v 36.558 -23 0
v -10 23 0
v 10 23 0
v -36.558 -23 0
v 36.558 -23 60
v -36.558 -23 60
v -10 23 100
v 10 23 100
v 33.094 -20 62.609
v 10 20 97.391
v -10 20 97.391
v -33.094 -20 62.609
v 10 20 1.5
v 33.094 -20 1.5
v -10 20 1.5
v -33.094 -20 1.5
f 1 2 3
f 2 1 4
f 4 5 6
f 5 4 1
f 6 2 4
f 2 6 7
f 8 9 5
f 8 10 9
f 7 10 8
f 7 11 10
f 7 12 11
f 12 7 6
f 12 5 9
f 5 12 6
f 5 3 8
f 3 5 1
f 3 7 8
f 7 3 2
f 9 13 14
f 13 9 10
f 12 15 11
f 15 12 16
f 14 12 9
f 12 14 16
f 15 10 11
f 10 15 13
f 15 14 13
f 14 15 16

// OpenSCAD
module trapezoid(b, t, h) {
    polygon(points=[
        [-b/2, -h/2],
        [+b/2, -h/2],
        [+t/2, +h/2],
        [-t/2, +h/2]
    ]);
}

module sloped_trapezoid_3d(trapezoid_base, trapezoid_top, trapezoid_height, min_height, max_height) {
    base_pts = [
        [-trapezoid_base/2, -trapezoid_height/2],
        [+trapezoid_base/2, -trapezoid_height/2],
        [+trapezoid_top/2, +trapezoid_height/2],
        [-trapezoid_top/2, +trapezoid_height/2]
    ];
    
    // Convert base points to 3D bottom and sloped top
    bottom = [for (p = base_pts) [p[0], p[1], 0]];
    top = [
        [base_pts[0][0], base_pts[0][1], min_height],  // short side
        [base_pts[1][0], base_pts[1][1], min_height],  // short side
        [base_pts[2][0], base_pts[2][1], max_height],  // tall side
        [base_pts[3][0], base_pts[3][1], max_height]   // tall side
    ];

    // Combine into 8-point polyhedron (bottom + top)
    polyhedron(
        points = concat(bottom, top),
        faces = [
            [0,1,2,3],  // bottom face
            [7,6,5,4],  // top face
            [4,5,1,0],  // front
            [5,6,2,1],  // right
            [6,7,3,2],  // back
            [7,4,0,3]   // left
        ]
    );
}

module lipstick_box(top_inner, fatness, wall_thickness, min_height, max_height) {
    fatness_inner = fatness;
    fatness_outer = fatness_inner + (4 * wall_thickness);
    base_inner = top_inner + (2 * fatness_inner / tan(60));
    base_outer = top_inner + (2 * fatness_outer / tan(60));
 
    
    difference() {
        sloped_trapezoid_3d(base_outer, top_inner, fatness_outer, min_height, max_height);

        translate([0, 0, wall_thickness]){
            linear_extrude(max_height)
            trapezoid(base_inner, top_inner, fatness_inner);
        }
    }
}

module lipstick_box_3d(top_inner, fatness, wall_thickness, height) {
    linear_extrude(height, scale=[1, 1])
        lipstick_box(20, fatness, wall_thickness);
    
    linear_extrude(base_thickness)
        trapezoid(top_inner + (2 * fatness / tan(60)), top_inner, fatness);
    
}

fatness = 40;
top_inner = 20;
wall_thickness = 1.5;
base_thickness = 3;
//color([1, 0, 0, 0.5])

cutout_inner = 14;
cutout_outer = 7;

min_height = 60;
max_height = 100;
lipstick_box(top_inner, fatness, wall_thickness, min_height, max_height);

/*
difference() {
    //translate ([0, -fatness/2, 0])
    lipstick_box_3d(top_inner, fatness, wall_thickness, min_height);

    // Opening for sliding
    linear_extrude(min_height - base_thickness){
        translate([0, (fatness/2)+wall_thickness, 0])
            trapezoid(cutout_inner, cutout_outer, wall_thickness*2);
    }
}
*/
